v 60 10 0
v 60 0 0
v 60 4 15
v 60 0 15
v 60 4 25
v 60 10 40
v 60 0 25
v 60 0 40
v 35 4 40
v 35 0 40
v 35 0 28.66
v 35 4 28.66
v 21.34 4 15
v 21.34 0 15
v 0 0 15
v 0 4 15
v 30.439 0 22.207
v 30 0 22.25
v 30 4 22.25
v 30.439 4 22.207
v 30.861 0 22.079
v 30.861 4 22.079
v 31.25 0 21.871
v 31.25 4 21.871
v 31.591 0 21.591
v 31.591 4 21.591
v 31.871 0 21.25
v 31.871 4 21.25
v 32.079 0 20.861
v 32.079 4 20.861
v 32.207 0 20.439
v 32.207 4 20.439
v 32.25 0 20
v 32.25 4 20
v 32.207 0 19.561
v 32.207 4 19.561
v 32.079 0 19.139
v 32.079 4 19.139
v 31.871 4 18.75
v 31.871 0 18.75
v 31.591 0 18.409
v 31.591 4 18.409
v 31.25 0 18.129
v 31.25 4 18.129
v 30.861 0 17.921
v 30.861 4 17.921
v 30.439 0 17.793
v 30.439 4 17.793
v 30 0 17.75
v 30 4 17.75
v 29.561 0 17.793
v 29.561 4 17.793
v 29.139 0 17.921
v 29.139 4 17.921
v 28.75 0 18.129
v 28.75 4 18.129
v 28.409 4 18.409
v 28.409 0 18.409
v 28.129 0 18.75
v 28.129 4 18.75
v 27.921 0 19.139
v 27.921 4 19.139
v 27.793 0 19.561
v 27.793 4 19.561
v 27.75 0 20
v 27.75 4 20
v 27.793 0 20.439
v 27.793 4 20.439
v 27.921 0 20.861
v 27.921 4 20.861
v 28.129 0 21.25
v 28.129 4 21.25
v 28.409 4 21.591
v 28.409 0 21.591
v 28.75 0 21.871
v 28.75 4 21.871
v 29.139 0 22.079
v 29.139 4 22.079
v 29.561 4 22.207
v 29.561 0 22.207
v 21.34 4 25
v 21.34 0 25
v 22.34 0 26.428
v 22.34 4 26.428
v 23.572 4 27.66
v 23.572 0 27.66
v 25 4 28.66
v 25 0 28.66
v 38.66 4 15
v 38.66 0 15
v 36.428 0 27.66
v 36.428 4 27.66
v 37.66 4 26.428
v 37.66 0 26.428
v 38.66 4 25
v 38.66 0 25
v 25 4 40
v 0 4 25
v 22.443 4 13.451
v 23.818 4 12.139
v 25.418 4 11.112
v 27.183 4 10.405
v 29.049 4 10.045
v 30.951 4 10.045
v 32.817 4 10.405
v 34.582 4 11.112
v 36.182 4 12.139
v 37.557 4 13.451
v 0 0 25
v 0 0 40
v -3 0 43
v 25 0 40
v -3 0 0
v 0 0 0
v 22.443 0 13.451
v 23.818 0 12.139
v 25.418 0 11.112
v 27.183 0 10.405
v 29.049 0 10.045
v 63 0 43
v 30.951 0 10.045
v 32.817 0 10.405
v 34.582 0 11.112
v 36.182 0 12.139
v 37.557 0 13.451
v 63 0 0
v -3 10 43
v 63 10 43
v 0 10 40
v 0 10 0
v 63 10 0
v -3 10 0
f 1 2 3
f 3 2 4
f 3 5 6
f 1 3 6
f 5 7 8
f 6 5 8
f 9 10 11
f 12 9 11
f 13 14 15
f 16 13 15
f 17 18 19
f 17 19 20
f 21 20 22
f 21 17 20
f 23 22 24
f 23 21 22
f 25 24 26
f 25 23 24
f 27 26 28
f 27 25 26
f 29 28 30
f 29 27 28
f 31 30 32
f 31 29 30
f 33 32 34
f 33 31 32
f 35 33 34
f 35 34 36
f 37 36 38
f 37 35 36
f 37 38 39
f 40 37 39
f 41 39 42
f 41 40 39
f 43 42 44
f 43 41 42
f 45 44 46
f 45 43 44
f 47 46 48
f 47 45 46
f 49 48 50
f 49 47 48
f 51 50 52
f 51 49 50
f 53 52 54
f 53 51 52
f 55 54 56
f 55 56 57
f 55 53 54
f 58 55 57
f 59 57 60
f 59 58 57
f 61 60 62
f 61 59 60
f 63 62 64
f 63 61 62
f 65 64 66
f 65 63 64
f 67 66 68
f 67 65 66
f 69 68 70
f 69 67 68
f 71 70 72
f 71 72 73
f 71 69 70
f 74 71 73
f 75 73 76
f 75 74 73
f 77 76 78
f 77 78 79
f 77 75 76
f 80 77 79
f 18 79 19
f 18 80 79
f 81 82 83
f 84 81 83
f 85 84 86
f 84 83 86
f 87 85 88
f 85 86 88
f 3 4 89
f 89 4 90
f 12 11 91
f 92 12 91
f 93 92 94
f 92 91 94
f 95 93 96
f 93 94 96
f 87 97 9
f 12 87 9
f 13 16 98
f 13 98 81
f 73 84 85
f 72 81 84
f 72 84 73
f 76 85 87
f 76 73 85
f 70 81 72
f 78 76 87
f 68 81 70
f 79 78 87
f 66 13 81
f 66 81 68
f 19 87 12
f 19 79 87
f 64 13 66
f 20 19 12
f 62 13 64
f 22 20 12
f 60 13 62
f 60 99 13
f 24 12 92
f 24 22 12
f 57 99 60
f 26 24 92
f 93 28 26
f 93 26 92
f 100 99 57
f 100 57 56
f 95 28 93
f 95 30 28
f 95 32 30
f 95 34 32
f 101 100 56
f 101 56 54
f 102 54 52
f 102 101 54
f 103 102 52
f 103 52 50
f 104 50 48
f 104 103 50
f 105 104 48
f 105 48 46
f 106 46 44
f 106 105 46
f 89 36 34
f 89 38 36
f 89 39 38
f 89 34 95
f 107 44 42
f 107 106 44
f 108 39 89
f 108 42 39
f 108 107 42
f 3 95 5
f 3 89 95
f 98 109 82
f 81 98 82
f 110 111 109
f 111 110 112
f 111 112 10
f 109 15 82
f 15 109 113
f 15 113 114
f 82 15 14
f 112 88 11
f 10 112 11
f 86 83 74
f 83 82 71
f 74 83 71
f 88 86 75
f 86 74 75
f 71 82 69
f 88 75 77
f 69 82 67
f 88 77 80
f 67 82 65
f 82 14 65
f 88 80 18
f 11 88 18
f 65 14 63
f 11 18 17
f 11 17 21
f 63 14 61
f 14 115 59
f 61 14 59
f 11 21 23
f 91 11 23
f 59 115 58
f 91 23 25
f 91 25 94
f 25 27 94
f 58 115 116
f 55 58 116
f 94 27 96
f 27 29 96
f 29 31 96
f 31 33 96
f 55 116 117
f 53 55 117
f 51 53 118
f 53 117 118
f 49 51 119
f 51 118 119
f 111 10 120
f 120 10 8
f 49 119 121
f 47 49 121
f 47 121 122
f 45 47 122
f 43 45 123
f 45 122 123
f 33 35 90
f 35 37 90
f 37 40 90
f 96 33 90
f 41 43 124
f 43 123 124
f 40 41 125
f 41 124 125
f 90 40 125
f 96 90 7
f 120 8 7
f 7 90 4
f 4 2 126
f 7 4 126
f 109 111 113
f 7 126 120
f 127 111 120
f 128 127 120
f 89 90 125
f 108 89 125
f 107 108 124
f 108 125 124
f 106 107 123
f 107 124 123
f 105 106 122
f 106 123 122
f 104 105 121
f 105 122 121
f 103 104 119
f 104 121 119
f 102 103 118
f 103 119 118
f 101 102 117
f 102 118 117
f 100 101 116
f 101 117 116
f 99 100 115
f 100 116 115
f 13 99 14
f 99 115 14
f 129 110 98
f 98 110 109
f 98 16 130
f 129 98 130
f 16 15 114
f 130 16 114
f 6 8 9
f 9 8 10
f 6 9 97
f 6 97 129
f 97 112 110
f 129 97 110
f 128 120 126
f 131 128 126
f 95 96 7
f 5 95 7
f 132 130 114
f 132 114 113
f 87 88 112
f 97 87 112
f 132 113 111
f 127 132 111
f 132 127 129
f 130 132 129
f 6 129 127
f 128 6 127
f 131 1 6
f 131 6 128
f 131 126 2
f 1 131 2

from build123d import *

# Parameters (mm, degrees)
BOSS_EXTRUDE1_DEPTH = 10
SKETCH2_R           = 2.25
BOSS_EXTRUDE2_DEPTH = 4


with BuildPart() as part:
    # Sketch1 → Boss-Extrude1 (new body)
    with BuildSketch(Plane(origin=(0, 0, 0), x_dir=(1, 0, 0), z_dir=(0, 1, 0))):
        Polygon((0, -40), (0, 0), (-3, 0), (-3, -43), (63, -43), (63, 0), (60, 0), (60, -40), align=None)
    extrude(amount=BOSS_EXTRUDE1_DEPTH)

    # Sketch2 → Boss-Extrude2 (add)
    with BuildSketch(Plane(origin=(0, 0, 0), x_dir=(1, 0, 0), z_dir=(0, 1, 0))):
        with BuildLine():
            Line((0, -15), (0, -25))
            Line((0, -25), (21.339745962, -25))
            ThreePointArc((21.339745962, -25), (22.928932188, -27.071067812), (25, -28.660254038))
            Line((25, -28.660254038), (25, -40))
            Line((25, -40), (35, -40))
            Line((35, -40), (35, -28.660254038))
            ThreePointArc((35, -28.660254038), (37.071067812, -27.071067812), (38.660254038, -25))
            Line((38.660254038, -25), (60, -25))
            Line((60, -25), (60, -15))
            Line((60, -15), (38.660254038, -15))
            ThreePointArc((38.660254038, -15), (30, -10), (21.339745962, -15))
            Line((21.339745962, -15), (0, -15))
        make_face()
        with Locations(Location((30, -20, 0), (0, 0, 270))):
            Circle(SKETCH2_R, mode=Mode.SUBTRACT)
    extrude(amount=BOSS_EXTRUDE2_DEPTH)


solid = part.part
